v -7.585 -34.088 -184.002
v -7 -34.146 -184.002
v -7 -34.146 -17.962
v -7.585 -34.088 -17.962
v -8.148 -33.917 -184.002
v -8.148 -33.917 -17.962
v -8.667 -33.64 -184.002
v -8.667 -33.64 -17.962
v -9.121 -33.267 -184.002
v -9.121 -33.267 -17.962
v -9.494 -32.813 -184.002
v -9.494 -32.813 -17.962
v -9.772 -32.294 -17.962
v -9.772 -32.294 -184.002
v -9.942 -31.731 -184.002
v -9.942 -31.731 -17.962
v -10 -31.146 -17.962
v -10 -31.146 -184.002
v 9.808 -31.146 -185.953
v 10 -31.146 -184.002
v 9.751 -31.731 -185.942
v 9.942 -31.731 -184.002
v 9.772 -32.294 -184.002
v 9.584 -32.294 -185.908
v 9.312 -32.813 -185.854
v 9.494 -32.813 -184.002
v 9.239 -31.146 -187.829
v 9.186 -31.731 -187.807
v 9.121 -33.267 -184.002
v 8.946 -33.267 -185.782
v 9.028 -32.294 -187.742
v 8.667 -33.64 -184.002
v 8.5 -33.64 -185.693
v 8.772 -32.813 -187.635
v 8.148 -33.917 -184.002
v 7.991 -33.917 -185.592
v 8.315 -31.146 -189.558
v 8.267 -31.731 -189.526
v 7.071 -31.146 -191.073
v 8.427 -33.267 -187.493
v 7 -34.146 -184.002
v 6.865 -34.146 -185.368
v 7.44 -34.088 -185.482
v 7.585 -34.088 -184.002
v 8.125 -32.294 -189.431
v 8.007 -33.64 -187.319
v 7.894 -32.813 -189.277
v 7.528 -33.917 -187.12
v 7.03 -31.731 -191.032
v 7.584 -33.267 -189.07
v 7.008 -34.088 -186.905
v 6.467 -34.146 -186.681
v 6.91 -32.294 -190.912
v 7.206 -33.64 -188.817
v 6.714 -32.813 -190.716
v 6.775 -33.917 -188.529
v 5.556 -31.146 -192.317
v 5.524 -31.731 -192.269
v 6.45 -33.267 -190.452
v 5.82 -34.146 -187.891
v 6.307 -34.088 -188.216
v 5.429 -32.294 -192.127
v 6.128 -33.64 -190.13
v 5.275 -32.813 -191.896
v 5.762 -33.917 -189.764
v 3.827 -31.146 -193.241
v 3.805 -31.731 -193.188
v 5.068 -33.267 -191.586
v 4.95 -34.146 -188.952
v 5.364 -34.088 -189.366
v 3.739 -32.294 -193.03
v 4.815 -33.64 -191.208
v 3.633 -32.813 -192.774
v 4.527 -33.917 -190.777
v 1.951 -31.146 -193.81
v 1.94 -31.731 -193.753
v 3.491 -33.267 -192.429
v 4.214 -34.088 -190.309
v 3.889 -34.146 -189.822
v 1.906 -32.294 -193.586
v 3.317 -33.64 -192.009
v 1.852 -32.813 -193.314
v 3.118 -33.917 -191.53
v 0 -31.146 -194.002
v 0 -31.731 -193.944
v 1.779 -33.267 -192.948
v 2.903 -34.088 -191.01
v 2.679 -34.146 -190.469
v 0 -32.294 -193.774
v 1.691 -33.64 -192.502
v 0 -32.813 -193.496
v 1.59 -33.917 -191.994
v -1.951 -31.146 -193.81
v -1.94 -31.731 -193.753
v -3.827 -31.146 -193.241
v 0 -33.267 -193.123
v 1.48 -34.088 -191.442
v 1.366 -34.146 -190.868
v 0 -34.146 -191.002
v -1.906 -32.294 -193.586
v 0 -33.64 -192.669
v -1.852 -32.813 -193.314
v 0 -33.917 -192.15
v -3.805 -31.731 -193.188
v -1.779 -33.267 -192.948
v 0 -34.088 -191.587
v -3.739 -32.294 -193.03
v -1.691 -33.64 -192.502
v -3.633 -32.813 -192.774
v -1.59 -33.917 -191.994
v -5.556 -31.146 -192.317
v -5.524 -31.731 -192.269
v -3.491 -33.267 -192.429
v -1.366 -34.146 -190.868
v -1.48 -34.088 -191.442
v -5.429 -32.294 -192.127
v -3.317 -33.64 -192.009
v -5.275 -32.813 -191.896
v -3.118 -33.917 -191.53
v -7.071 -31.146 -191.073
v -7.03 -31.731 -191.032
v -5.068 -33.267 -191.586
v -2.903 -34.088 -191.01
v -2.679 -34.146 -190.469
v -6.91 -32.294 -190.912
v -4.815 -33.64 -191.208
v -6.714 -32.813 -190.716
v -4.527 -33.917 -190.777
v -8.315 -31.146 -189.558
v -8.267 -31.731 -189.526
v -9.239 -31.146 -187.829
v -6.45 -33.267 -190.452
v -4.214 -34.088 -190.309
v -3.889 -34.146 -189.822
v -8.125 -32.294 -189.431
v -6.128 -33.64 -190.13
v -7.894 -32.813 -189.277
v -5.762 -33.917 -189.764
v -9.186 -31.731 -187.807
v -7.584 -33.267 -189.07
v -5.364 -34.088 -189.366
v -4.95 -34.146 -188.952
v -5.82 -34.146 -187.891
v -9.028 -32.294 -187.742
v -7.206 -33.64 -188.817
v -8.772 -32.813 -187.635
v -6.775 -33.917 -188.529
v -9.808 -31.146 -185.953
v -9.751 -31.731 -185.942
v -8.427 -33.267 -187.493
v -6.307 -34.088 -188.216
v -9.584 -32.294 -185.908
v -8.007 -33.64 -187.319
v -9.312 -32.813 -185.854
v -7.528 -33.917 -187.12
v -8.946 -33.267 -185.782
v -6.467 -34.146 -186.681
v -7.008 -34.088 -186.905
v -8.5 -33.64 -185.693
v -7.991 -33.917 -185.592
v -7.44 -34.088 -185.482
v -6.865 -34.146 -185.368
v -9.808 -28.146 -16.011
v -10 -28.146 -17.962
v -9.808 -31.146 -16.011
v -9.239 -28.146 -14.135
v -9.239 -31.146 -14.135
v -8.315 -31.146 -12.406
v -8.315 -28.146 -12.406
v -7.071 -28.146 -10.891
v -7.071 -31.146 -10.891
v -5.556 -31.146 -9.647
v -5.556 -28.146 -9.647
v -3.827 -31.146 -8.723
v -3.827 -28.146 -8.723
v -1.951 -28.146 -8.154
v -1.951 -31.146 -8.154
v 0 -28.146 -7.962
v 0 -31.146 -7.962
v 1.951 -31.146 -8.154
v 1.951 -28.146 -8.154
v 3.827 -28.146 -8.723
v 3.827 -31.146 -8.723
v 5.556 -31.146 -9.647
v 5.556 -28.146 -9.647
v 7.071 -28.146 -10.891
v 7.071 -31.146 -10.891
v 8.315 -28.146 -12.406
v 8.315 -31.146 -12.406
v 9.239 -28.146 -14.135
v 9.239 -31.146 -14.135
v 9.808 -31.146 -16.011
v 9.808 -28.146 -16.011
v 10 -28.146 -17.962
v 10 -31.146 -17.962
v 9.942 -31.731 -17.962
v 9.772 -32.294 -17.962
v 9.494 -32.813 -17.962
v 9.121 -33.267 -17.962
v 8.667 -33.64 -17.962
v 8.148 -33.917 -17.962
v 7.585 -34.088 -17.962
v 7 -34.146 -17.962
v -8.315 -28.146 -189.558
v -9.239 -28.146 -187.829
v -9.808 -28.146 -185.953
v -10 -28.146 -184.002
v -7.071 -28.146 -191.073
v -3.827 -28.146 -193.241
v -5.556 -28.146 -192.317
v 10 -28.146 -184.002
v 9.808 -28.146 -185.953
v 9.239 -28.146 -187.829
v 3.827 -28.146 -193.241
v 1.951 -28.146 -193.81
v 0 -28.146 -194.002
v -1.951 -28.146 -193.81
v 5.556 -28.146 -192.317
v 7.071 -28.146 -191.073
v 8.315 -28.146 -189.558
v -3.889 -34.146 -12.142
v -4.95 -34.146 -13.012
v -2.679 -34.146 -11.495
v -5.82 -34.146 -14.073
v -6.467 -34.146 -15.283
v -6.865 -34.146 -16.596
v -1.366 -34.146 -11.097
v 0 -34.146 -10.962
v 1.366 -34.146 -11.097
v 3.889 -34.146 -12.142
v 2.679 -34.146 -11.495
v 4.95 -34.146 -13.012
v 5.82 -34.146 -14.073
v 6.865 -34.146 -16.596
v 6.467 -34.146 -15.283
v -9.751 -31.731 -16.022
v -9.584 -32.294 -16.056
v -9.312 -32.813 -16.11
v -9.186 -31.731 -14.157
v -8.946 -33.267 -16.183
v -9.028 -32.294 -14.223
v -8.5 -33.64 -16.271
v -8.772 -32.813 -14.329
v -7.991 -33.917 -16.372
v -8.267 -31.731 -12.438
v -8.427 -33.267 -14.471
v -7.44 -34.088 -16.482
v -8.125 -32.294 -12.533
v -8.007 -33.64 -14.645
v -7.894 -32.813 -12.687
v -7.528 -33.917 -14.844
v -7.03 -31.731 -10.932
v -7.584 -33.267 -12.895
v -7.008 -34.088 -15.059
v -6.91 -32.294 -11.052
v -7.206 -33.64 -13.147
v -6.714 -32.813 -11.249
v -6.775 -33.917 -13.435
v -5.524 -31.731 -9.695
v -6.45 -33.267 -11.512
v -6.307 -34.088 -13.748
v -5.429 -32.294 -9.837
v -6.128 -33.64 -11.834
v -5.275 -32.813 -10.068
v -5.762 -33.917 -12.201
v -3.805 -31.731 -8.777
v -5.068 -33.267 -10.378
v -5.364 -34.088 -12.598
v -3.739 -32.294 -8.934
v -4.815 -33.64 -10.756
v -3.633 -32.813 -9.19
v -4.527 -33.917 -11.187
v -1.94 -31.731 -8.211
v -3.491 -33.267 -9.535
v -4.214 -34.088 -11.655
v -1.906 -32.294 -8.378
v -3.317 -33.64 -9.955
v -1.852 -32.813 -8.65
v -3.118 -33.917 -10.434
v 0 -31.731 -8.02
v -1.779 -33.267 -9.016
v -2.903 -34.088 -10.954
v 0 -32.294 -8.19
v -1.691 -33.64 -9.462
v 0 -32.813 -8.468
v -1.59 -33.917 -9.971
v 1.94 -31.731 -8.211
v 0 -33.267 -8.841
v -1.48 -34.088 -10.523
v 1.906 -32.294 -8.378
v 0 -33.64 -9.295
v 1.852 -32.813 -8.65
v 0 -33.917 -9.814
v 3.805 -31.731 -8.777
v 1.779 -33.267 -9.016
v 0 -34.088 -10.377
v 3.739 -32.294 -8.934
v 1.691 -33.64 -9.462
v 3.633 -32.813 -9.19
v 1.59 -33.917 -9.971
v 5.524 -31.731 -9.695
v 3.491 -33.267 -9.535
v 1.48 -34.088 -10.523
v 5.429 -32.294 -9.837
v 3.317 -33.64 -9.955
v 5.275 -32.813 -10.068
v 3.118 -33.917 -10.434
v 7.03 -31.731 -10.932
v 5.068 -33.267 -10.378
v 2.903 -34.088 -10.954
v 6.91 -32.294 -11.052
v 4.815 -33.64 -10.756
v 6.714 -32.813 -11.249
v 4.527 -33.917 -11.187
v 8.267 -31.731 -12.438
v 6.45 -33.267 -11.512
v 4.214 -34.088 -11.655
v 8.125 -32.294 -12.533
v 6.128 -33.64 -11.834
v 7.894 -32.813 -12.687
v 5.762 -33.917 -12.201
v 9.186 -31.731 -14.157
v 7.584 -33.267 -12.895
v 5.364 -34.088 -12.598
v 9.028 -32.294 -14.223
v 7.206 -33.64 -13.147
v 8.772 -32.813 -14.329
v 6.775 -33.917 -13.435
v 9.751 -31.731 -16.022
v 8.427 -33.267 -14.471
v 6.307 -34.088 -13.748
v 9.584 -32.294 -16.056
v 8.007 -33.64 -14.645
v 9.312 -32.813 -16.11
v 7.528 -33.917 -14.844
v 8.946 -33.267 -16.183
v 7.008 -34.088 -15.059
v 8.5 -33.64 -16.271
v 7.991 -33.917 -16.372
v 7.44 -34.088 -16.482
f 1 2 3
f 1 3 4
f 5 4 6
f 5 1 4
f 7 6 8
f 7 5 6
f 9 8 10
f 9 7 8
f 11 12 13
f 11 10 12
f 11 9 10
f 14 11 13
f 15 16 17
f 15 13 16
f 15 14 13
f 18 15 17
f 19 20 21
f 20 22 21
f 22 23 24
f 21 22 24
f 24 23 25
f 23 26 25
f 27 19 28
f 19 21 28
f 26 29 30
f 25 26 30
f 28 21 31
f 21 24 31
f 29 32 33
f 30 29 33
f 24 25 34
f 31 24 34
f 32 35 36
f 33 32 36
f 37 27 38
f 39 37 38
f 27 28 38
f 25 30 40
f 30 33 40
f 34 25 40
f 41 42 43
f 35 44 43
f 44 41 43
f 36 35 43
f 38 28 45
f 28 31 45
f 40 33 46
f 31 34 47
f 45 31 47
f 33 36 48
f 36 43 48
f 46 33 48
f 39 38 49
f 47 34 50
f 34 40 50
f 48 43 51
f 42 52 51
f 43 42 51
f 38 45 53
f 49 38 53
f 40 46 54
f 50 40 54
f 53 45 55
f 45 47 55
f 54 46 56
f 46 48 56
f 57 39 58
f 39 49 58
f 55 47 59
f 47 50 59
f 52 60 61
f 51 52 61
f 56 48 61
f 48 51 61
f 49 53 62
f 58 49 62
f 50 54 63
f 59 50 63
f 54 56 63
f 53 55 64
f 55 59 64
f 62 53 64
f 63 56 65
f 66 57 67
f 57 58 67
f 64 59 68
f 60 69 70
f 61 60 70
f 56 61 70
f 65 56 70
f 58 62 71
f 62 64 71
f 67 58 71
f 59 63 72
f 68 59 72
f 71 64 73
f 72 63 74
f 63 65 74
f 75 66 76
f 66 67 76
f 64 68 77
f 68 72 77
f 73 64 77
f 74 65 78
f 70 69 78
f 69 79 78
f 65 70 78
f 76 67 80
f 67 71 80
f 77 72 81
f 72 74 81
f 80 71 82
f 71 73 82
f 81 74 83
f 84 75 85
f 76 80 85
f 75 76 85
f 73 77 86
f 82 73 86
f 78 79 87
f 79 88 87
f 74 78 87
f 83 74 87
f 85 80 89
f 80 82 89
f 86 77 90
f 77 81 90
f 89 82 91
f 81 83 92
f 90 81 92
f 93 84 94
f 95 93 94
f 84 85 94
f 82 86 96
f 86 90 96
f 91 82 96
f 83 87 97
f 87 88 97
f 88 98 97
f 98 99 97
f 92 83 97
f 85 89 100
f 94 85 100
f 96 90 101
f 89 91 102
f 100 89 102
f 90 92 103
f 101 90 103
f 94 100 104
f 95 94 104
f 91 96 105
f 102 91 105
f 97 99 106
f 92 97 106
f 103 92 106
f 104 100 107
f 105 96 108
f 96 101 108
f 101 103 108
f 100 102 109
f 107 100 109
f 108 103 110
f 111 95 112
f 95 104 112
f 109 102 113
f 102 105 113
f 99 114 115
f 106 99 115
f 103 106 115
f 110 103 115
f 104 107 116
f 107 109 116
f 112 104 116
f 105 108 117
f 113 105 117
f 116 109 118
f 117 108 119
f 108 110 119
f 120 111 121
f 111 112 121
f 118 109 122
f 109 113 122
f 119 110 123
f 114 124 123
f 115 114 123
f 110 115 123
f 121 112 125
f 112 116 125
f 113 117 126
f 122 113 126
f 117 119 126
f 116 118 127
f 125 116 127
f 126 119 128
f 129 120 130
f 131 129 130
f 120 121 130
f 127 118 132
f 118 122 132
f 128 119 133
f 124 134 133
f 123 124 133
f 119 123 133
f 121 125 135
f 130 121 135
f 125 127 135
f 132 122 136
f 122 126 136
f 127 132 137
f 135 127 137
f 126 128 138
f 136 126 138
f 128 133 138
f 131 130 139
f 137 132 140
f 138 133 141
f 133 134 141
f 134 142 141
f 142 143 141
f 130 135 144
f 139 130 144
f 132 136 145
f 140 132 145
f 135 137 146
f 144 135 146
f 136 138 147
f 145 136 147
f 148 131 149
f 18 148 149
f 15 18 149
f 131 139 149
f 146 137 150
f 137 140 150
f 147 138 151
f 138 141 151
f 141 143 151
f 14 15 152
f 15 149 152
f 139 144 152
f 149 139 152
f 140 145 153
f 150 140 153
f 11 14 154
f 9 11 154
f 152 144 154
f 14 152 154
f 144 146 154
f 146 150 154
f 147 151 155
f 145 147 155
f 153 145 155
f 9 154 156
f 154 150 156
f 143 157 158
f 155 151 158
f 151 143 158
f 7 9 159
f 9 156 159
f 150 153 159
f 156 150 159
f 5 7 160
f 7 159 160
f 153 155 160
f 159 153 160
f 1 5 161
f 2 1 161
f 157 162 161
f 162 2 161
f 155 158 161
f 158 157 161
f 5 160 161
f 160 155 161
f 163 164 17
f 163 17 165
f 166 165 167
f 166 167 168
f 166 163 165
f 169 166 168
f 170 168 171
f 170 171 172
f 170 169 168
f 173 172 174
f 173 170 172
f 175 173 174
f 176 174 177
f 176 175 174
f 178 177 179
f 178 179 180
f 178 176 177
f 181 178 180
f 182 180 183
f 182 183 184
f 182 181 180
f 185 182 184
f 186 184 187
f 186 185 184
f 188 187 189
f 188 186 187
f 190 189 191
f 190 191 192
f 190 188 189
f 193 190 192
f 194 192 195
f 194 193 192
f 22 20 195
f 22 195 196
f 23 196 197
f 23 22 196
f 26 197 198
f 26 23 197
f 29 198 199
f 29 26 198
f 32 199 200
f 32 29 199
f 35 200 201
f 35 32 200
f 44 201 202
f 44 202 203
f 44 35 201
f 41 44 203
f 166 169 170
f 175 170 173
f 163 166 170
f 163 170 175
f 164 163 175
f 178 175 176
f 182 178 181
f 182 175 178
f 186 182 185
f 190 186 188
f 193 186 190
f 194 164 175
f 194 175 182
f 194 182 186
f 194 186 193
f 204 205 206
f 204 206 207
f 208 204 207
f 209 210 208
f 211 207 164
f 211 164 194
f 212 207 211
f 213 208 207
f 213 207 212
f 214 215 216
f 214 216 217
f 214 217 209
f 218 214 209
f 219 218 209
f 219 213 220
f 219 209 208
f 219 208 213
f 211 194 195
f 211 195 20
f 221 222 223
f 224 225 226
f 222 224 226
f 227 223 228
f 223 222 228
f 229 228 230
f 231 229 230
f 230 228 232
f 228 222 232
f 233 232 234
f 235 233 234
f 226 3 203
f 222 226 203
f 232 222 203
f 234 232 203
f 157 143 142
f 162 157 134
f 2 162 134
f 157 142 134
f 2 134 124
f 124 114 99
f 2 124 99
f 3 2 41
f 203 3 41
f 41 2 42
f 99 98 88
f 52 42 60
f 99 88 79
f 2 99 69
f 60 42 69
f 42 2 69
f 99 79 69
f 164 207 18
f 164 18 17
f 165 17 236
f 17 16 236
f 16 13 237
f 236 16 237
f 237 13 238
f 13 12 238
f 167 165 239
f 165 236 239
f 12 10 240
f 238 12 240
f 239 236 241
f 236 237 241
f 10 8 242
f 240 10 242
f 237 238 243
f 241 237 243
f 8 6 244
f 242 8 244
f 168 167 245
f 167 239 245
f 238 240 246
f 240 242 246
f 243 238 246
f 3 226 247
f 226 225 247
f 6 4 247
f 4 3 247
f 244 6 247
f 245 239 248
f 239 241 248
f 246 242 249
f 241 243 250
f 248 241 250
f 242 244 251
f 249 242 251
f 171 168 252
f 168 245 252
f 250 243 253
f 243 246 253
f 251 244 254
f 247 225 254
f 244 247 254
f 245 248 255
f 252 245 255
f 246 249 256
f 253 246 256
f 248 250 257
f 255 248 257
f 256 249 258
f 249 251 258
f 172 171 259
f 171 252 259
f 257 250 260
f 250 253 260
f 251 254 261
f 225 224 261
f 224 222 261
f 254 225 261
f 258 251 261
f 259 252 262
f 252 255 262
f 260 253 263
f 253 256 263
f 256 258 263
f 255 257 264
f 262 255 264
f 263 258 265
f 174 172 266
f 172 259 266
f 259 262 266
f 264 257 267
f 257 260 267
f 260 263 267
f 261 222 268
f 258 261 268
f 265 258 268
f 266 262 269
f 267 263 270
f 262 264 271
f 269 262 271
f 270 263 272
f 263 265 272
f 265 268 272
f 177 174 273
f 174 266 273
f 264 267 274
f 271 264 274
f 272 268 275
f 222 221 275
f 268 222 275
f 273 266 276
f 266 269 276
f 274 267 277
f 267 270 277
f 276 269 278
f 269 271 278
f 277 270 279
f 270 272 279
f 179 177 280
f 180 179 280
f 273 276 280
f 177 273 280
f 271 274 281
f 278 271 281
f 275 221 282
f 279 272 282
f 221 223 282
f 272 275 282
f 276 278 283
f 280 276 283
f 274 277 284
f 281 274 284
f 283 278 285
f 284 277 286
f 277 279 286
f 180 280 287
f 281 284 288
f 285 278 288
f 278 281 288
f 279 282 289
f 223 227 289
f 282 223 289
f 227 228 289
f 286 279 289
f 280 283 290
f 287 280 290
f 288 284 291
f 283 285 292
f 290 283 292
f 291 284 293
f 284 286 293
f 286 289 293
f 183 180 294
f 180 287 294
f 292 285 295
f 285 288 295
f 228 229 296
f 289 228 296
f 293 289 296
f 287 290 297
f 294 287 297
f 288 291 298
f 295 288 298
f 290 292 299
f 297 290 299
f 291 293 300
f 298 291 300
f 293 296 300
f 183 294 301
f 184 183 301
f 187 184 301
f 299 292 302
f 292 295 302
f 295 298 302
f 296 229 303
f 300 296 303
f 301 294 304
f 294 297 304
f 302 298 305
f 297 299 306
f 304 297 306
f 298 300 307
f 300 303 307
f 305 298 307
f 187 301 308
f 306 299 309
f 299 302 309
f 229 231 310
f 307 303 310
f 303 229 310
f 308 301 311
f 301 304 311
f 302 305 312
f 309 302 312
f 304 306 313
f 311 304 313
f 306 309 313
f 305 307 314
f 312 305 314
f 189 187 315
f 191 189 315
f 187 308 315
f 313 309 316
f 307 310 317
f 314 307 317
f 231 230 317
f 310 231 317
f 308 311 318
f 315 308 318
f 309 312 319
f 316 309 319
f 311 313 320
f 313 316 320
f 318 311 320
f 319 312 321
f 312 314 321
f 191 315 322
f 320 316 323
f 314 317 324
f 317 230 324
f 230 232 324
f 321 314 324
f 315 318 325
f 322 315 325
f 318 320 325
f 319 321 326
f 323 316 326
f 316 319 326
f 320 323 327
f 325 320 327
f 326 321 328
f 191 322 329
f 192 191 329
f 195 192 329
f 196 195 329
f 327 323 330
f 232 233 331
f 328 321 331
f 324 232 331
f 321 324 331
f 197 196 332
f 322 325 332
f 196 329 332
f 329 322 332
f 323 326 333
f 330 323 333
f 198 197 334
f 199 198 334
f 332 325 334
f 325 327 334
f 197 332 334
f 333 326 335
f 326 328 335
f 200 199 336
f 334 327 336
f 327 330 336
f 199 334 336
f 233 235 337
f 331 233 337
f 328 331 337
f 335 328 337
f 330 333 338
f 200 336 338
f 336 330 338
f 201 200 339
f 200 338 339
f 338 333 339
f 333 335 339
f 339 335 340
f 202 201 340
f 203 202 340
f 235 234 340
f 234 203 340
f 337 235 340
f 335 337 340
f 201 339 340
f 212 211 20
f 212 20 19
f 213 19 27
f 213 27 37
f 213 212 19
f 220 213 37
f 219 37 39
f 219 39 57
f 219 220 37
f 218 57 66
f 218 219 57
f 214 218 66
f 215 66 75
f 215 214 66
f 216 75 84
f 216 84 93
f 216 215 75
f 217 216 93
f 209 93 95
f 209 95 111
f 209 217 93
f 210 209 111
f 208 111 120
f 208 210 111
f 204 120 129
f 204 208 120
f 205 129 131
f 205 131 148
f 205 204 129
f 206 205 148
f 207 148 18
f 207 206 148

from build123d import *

# Parameters (mm, degrees)
BOSS_EXTRUDE1_DEPTH = 6
CAVITY1_START       = -194.002075021
CAVITY1_DEPTH       = 186.04
CAVITY1_2_ANGLE     = 180
CAVITY1_3_ANGLE     = 180


with BuildPart() as part:
    # Sketch1 → Boss-Extrude1 (new body)
    with BuildSketch(Plane(origin=(0, -28.145825623, 0), x_dir=(1, 0, 0), z_dir=(0, 1, 0))):
        with BuildLine():
            Line((-10, 184.002075021), (-10, 17.962075021))
            ThreePointArc((-10, 17.962075021), (0, 7.962075021), (10, 17.962075021))
            Line((10, 17.962075021), (10, 184.002075021))
            ThreePointArc((10, 184.002075021), (0, 194.002075021), (-10, 184.002075021))
        make_face()
    extrude(amount=-BOSS_EXTRUDE1_DEPTH)

    # Cavity1: read off the stored shape, not the designer's step
    # Cavity1 outline → Cavity1 (cut)
    with BuildSketch(Plane.XY.offset(CAVITY1_START)):
        with BuildLine():
            Line((10, -34.145825623), (10, -31.145825623))
            ThreePointArc((10, -31.145825623), (9.121320344, -33.267145967), (7, -34.145825623))
            Line((7, -34.145825623), (10, -34.145825623))
        make_face()
        with BuildLine():
            Line((-10, -34.145825623), (-7, -34.145825623))
            ThreePointArc((-7, -34.145825623), (-9.121320344, -33.267145967), (-10, -31.145825623))
            Line((-10, -31.145825623), (-10, -34.145825623))
        make_face()
    extrude(amount=CAVITY1_DEPTH, mode=Mode.SUBTRACT)

    # Cavity1 2 outline → Cavity1 2 (revolve, cut)
    with BuildSketch(Plane.XY.offset(-184.002075021)):
        with BuildLine():
            ThreePointArc((10, -31.145825623), (9.121320344, -33.267145967), (7, -34.145825623))
            Line((7, -34.145825623), (10, -34.145825623))
            Line((10, -34.145825623), (10, -31.145825623))
        make_face()
    revolve(axis=Axis((0, 0, -184.002075021), (0, 1, 0)), revolution_arc=CAVITY1_2_ANGLE, mode=Mode.SUBTRACT)

    # Cavity1 3 outline → Cavity1 3 (revolve, cut)
    with BuildSketch(Plane(origin=(0, 0, -17.962075021), x_dir=(-1, 0, 0), z_dir=(0, 0, -1))):
        with BuildLine():
            ThreePointArc((10, -31.145825623), (9.121320344, -33.267145967), (7, -34.145825623))
            Line((7, -34.145825623), (10, -34.145825623))
            Line((10, -34.145825623), (10, -31.145825623))
        make_face()
    revolve(axis=Axis((0, 0, -17.962075021), (0, 1, 0)), revolution_arc=CAVITY1_3_ANGLE, mode=Mode.SUBTRACT)


solid = part.part
